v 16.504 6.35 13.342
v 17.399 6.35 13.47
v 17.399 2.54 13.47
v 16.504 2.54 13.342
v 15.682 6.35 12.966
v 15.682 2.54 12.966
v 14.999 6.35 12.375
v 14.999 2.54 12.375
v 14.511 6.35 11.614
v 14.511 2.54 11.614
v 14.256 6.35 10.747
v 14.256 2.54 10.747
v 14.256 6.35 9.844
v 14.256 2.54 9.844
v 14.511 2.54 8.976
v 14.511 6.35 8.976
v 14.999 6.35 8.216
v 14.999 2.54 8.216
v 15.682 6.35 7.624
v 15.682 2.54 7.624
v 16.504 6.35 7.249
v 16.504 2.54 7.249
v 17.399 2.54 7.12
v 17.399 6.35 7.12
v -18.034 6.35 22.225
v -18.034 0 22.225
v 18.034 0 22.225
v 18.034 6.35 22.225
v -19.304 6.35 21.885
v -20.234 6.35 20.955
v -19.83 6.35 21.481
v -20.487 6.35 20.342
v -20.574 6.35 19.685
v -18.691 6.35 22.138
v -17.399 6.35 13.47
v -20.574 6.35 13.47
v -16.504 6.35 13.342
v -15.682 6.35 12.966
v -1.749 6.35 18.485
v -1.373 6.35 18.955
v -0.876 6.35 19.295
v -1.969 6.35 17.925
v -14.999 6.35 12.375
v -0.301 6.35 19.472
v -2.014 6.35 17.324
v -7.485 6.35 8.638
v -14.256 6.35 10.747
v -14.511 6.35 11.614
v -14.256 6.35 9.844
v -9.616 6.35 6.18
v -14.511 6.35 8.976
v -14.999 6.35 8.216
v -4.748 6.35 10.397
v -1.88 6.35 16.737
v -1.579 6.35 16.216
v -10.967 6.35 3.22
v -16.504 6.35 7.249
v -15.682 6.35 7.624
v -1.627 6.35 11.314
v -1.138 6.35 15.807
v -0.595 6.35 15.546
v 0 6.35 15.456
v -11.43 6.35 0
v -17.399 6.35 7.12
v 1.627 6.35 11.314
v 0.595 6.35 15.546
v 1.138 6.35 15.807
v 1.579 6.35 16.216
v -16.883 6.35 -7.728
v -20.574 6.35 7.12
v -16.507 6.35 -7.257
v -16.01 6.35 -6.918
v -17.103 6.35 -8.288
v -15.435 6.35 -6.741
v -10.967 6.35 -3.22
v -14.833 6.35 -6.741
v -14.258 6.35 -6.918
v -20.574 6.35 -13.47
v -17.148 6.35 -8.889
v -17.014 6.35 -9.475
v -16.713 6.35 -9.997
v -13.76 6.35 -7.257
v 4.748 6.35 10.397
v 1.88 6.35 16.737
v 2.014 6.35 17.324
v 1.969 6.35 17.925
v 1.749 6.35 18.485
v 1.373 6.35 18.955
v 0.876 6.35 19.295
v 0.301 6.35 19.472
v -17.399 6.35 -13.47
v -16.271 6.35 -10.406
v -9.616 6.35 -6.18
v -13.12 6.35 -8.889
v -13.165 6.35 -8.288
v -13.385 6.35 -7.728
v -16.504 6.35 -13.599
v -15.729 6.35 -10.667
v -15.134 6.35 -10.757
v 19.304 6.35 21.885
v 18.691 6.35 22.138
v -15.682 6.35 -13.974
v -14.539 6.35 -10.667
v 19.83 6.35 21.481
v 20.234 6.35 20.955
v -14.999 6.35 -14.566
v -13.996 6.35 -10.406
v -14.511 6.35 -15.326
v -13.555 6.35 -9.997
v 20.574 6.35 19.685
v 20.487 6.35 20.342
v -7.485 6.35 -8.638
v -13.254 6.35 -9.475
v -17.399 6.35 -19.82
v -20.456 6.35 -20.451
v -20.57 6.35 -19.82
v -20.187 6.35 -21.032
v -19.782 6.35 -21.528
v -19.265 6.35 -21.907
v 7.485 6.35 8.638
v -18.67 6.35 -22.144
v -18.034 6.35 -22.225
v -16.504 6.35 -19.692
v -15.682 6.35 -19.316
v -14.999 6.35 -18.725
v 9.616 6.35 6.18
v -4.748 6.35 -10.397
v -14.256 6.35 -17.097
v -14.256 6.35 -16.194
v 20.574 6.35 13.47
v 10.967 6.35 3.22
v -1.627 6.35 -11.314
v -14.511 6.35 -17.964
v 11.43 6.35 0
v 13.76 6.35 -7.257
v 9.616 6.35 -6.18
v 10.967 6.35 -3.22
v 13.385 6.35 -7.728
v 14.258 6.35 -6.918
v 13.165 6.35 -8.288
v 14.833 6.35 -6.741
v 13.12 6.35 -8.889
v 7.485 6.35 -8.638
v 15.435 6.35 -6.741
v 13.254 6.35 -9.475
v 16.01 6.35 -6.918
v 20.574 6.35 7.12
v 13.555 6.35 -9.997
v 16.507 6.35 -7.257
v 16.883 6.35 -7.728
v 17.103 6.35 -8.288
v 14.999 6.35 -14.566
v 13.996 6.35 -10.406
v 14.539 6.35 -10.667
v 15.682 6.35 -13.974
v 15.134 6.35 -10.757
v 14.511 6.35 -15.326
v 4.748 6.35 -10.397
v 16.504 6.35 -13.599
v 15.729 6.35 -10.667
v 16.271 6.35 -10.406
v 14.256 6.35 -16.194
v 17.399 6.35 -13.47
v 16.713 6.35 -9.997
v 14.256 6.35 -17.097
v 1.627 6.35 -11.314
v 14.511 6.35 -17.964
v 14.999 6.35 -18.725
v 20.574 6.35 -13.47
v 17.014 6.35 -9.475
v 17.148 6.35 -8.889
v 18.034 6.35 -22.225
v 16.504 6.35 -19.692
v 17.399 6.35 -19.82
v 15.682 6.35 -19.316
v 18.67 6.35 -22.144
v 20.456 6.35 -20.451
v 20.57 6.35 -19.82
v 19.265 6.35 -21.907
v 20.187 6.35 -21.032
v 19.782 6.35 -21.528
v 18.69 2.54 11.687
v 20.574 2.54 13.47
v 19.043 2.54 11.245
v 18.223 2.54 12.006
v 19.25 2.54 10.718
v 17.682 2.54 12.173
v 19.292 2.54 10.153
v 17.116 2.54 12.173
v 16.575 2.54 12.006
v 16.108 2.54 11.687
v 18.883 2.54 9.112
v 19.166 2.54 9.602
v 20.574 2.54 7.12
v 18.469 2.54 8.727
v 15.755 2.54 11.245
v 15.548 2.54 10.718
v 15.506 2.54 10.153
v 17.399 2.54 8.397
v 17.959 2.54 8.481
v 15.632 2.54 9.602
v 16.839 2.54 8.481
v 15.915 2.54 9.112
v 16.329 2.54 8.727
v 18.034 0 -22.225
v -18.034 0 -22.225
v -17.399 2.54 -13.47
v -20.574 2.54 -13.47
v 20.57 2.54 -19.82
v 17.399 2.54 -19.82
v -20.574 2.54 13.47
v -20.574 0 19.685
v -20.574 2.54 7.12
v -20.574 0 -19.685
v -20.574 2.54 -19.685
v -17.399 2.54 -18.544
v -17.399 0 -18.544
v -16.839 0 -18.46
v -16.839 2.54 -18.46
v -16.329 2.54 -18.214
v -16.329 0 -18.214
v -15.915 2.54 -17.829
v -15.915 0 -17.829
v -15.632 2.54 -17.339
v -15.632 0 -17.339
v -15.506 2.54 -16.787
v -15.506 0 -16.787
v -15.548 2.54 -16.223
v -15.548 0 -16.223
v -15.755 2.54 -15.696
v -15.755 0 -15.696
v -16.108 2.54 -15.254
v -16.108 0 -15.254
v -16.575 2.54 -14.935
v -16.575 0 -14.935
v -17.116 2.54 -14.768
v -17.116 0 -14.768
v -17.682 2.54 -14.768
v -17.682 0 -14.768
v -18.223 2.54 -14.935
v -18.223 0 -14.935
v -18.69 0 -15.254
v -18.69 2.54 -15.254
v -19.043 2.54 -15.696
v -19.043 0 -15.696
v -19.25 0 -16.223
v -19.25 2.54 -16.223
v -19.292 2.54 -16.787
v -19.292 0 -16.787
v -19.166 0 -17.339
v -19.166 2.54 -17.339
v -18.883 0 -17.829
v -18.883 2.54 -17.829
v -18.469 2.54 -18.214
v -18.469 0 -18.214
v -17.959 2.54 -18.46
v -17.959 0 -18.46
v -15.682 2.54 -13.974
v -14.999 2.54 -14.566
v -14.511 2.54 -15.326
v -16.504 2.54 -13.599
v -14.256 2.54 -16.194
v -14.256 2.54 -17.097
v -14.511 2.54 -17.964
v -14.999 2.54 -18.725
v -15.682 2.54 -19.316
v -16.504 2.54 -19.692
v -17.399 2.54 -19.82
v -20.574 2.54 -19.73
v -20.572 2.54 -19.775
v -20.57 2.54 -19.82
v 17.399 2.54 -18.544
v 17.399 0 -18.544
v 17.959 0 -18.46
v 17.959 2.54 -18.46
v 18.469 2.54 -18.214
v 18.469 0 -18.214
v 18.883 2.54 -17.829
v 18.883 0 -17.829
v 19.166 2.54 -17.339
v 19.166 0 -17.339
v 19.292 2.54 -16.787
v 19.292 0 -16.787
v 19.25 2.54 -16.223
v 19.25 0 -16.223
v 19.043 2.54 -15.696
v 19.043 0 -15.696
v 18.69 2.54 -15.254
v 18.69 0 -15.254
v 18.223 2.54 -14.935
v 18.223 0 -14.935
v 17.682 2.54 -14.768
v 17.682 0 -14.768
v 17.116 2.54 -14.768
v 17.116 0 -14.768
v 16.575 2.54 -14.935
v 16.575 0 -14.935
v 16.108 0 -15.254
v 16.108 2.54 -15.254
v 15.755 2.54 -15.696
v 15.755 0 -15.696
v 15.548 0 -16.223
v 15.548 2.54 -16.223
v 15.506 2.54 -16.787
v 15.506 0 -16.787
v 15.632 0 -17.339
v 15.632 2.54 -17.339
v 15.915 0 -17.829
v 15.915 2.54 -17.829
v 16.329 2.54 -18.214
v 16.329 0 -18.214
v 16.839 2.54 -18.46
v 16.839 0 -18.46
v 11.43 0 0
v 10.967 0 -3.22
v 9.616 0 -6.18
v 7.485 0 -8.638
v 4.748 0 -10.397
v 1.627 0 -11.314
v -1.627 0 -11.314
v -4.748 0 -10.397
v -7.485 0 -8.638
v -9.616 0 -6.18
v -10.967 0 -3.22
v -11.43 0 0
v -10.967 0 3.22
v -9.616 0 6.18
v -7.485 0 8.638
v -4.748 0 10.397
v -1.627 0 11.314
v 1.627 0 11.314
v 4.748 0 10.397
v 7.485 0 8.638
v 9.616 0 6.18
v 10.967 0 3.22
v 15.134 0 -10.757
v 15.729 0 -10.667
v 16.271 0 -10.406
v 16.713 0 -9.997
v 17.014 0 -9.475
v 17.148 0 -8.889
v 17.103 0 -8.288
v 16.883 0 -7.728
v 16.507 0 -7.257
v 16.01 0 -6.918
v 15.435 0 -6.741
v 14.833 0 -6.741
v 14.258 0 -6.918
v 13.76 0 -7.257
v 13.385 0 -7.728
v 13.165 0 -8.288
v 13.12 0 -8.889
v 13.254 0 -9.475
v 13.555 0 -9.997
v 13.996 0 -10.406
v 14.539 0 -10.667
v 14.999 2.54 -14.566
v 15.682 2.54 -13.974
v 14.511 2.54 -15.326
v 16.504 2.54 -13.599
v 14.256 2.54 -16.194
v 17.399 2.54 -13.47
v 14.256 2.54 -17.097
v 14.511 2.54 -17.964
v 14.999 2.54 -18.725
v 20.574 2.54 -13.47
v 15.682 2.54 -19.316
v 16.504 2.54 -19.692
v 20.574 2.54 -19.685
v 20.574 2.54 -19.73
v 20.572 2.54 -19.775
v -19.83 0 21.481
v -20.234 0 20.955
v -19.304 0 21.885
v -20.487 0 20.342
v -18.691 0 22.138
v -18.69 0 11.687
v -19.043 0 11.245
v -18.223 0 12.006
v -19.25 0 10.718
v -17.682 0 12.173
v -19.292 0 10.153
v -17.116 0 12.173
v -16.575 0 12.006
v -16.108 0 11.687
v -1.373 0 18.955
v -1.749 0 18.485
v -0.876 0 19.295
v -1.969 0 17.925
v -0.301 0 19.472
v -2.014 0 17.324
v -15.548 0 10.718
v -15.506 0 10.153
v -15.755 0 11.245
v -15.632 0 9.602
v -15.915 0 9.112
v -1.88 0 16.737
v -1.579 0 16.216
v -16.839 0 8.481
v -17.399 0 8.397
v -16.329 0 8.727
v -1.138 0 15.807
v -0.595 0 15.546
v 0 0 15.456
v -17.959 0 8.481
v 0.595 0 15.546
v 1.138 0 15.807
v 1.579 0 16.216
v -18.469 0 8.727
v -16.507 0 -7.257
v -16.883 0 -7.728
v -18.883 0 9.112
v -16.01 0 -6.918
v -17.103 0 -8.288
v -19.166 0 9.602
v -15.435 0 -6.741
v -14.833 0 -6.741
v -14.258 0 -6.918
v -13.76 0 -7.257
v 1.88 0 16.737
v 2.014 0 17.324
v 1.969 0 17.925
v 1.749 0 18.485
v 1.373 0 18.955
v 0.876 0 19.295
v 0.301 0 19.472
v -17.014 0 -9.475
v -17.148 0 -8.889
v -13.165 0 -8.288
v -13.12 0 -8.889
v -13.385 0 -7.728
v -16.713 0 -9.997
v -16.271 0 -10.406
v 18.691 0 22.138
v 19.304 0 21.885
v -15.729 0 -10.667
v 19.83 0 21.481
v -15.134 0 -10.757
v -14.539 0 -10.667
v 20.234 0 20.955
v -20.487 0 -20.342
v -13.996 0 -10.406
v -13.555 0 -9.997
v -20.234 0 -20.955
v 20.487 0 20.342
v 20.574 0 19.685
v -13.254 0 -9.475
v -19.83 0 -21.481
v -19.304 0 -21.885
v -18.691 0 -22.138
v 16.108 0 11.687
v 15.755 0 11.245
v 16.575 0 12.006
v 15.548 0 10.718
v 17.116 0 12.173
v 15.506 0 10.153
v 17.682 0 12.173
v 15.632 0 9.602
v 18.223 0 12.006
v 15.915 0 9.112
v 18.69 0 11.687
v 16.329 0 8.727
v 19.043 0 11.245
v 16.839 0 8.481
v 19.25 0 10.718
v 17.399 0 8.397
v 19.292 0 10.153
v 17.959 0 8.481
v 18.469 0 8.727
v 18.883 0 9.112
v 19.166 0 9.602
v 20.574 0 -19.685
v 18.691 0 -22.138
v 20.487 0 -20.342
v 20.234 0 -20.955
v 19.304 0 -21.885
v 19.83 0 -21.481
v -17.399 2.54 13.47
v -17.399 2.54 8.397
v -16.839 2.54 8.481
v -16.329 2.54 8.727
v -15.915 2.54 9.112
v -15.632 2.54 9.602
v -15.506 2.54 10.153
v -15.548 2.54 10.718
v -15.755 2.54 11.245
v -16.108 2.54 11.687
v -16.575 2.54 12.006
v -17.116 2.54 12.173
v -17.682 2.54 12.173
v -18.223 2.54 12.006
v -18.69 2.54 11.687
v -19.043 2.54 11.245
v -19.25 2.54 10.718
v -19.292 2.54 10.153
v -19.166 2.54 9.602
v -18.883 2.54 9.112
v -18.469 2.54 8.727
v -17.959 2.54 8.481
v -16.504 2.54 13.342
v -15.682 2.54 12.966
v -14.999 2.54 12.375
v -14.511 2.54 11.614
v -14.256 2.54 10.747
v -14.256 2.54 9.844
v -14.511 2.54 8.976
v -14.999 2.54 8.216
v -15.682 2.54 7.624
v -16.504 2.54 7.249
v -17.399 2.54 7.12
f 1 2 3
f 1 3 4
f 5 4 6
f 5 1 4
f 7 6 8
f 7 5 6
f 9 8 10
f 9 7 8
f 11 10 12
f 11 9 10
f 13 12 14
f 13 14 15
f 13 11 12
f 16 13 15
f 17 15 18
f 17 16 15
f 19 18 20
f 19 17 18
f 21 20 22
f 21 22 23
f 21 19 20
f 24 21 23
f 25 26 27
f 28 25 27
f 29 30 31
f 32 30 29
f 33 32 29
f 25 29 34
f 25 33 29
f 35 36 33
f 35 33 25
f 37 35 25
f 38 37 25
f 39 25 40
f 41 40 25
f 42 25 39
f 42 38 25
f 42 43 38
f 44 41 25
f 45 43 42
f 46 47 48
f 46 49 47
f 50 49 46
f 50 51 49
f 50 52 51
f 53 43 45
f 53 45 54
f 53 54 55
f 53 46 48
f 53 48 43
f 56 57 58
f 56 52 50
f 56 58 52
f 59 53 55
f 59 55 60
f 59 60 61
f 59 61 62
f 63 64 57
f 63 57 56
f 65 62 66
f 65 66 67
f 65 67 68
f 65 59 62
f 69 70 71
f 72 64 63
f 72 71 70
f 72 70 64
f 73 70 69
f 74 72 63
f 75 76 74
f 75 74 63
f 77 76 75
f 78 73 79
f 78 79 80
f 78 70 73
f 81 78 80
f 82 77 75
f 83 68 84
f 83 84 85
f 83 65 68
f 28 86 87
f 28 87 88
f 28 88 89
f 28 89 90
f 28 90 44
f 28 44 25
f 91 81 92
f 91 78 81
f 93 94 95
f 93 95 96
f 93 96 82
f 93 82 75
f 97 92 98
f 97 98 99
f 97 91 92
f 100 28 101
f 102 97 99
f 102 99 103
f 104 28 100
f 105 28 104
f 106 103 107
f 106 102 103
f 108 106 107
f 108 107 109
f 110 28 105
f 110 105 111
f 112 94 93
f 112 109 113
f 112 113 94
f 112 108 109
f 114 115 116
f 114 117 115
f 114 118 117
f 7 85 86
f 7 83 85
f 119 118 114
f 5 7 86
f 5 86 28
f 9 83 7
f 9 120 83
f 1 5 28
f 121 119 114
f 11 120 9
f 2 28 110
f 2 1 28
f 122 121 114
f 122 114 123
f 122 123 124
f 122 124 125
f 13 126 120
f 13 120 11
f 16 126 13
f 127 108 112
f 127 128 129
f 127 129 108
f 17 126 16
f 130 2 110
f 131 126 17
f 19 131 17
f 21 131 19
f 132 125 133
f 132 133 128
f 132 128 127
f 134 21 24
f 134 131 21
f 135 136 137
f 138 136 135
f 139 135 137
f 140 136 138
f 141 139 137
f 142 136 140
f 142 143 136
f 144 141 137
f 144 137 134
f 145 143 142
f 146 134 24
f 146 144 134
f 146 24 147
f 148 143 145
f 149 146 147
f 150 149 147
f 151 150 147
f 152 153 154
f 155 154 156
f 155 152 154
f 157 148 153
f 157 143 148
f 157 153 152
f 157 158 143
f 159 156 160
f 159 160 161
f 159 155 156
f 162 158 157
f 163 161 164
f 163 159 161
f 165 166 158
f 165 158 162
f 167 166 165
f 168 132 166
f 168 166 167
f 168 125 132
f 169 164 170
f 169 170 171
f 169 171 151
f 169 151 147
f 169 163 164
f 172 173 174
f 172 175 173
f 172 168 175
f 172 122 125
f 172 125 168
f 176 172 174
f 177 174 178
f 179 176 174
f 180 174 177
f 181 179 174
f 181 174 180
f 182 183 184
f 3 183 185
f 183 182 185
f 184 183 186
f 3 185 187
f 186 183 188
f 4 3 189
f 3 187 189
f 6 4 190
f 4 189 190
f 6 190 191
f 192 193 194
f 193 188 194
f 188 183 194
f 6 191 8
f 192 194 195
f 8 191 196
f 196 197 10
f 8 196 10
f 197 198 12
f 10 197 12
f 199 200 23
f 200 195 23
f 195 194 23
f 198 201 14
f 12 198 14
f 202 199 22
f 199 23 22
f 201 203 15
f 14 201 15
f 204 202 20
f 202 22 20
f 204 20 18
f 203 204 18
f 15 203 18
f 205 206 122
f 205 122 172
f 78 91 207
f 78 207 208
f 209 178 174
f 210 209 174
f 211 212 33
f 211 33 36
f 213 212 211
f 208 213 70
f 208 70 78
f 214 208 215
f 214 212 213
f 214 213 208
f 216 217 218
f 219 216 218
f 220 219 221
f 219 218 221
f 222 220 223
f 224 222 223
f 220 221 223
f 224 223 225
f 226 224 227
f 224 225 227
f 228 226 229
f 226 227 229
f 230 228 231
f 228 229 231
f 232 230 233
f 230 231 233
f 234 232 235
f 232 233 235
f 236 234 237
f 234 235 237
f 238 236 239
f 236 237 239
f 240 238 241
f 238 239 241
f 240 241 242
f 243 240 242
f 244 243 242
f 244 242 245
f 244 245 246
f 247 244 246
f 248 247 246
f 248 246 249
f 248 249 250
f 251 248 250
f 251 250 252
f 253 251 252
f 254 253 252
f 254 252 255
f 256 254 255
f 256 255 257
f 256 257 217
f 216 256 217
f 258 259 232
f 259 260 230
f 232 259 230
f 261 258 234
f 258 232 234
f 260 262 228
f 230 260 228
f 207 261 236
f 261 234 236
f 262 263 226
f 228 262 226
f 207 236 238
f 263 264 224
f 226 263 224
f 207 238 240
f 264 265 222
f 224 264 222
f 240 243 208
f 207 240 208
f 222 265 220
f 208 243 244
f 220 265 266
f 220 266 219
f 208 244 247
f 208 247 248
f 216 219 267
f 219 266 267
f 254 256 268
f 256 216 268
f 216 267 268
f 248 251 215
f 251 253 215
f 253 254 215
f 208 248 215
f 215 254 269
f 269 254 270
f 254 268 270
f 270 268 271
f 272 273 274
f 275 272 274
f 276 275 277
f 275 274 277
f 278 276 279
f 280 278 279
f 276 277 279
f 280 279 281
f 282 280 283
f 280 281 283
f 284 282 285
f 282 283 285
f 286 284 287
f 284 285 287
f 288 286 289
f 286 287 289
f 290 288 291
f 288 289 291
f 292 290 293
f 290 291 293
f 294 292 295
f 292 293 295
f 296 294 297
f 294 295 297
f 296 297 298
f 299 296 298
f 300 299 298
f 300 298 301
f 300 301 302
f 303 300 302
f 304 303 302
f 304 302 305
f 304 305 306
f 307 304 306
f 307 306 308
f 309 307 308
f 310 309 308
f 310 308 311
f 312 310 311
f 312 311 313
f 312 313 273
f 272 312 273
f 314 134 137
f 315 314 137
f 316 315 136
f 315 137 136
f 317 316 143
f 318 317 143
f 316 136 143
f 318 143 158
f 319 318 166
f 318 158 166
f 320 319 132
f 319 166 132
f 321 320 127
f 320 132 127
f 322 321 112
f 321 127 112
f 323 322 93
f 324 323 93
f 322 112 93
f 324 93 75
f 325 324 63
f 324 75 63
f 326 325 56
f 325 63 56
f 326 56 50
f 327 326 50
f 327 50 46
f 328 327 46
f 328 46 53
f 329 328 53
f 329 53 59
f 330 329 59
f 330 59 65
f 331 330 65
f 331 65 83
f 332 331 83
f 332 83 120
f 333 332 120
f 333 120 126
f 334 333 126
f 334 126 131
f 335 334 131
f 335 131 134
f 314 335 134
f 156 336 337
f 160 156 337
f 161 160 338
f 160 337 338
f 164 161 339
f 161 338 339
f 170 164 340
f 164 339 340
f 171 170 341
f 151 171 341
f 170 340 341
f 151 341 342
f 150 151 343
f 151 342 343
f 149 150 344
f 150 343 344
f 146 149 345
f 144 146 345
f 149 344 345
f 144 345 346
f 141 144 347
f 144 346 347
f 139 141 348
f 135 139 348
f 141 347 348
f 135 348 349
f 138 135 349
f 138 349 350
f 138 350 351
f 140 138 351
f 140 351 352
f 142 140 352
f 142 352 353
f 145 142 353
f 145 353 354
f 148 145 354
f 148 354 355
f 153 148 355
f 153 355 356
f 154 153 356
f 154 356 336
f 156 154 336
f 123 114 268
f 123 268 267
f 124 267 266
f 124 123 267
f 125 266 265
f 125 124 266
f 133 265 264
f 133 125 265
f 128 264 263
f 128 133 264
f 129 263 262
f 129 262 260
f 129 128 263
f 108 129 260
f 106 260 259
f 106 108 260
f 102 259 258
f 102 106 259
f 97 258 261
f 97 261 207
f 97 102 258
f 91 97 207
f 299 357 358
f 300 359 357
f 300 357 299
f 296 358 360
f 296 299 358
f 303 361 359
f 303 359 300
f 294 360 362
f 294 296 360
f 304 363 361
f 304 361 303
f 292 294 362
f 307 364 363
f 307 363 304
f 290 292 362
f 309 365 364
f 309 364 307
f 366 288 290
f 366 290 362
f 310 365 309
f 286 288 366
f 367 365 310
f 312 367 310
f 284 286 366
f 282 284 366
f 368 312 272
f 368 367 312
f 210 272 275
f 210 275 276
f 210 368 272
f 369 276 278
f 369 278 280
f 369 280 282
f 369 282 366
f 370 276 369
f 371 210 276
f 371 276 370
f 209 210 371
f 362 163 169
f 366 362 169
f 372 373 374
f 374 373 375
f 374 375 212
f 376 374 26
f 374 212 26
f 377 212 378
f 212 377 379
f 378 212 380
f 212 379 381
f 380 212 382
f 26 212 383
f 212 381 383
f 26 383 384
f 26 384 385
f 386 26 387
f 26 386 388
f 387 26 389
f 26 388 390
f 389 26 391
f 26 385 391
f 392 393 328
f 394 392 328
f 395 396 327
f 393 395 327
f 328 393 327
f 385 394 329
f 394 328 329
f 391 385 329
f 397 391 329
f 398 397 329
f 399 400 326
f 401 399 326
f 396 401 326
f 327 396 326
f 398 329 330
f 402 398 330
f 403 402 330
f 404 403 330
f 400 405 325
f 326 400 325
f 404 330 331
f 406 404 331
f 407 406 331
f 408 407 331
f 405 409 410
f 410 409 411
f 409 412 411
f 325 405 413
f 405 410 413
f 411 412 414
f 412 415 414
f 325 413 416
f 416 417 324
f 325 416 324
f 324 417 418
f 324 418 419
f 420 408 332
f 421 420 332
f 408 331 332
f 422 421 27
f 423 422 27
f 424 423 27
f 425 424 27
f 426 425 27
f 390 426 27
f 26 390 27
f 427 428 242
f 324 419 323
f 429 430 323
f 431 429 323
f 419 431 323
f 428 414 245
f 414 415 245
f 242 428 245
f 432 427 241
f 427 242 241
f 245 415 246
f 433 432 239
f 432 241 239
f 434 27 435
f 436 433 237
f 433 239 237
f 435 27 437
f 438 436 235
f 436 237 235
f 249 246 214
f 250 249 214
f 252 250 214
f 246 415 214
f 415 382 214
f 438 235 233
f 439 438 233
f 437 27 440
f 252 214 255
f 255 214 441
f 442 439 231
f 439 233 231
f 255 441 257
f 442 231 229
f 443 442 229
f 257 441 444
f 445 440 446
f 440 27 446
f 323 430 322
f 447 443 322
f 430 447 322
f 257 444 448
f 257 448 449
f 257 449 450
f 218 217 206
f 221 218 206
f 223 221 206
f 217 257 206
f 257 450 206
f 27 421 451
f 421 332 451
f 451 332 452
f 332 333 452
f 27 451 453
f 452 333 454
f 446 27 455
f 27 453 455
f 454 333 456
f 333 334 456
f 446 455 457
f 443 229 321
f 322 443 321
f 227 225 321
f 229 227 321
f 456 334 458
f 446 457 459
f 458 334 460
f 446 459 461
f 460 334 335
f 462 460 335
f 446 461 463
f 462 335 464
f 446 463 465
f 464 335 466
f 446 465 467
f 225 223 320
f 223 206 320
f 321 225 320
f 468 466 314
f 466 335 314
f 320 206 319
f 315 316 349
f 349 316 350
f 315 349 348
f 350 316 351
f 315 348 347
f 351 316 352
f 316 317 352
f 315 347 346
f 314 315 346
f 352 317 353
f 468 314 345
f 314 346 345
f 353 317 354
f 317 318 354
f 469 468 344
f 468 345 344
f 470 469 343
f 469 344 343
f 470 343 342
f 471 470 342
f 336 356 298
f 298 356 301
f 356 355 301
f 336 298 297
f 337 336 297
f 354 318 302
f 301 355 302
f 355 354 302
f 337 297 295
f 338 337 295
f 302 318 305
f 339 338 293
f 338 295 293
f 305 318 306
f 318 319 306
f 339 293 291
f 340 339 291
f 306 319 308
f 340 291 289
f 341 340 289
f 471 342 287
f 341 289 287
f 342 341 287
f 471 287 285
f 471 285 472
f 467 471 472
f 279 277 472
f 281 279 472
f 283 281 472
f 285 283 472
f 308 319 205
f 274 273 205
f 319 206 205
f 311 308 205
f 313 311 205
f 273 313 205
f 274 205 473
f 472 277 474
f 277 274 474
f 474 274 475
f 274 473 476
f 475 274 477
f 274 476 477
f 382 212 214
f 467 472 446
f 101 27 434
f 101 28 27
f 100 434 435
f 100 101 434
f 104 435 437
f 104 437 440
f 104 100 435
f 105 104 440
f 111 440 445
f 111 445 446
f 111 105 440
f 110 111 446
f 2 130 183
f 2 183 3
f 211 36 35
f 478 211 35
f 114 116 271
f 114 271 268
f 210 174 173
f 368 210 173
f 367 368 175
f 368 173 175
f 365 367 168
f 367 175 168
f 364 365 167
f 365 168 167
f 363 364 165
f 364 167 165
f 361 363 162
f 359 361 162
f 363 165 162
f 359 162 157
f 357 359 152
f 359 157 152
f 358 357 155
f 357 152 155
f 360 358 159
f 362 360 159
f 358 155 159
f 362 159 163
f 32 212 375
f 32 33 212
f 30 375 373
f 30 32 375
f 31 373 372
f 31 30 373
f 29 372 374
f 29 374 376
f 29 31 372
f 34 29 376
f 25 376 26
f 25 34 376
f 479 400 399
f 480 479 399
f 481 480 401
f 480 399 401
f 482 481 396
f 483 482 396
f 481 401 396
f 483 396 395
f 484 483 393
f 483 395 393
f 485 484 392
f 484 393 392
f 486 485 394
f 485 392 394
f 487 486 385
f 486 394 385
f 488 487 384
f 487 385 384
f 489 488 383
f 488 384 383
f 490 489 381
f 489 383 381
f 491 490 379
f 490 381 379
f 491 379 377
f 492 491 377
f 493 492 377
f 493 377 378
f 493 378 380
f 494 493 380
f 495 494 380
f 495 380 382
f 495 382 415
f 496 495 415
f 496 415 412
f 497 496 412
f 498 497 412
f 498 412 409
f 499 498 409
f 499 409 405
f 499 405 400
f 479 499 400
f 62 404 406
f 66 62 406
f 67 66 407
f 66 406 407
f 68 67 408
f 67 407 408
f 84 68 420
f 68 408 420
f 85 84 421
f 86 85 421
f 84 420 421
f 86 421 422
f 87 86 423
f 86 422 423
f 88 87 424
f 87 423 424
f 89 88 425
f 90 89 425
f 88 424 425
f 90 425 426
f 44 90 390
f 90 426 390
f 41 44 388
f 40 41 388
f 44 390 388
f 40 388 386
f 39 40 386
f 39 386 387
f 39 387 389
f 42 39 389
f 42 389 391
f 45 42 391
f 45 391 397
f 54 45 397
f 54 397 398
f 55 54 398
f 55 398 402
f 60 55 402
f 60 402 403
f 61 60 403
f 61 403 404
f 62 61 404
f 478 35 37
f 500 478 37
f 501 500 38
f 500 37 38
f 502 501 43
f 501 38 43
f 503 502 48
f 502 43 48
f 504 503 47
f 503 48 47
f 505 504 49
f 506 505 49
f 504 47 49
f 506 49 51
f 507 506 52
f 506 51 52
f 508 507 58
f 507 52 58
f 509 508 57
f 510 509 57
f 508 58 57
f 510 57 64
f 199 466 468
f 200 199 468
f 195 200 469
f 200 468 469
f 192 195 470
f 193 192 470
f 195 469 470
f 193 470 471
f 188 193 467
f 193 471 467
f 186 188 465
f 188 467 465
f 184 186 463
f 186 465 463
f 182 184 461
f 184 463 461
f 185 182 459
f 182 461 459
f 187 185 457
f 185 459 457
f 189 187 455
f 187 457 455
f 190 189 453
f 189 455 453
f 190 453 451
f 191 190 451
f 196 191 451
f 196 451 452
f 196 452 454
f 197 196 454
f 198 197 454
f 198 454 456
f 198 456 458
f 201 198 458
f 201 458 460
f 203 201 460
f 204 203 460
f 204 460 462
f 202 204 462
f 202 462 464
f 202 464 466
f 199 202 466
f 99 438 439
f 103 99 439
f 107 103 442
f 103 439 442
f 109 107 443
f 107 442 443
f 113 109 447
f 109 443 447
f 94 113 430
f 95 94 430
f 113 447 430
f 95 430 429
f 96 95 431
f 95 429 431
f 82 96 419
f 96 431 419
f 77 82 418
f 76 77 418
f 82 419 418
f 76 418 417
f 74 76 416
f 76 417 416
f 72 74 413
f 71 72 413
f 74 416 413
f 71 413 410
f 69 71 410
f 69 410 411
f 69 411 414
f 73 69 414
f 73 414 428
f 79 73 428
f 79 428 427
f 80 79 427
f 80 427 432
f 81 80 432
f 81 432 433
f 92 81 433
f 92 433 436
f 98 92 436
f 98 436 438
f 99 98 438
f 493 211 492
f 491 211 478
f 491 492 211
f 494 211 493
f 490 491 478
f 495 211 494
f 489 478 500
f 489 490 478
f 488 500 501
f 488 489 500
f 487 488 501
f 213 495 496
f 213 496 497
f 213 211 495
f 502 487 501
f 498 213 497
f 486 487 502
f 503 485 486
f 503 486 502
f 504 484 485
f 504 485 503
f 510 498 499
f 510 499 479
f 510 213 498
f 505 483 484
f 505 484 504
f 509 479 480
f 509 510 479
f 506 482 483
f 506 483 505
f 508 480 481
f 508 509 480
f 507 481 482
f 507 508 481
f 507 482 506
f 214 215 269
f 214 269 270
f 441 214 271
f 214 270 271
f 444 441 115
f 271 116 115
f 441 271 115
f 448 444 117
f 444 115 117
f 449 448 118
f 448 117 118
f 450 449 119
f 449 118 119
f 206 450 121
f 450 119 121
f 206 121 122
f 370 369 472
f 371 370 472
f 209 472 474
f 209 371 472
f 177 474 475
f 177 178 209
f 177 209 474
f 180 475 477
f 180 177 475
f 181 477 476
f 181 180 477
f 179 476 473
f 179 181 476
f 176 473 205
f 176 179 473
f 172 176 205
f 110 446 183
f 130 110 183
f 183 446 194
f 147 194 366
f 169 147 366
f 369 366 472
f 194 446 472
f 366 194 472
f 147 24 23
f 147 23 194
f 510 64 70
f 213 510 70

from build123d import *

# Parameters (mm, degrees)
SKETCH1_W                    = 41.148
SKETCH1_H                    = 44.45
BOSS_EXTRUDE1_DEPTH          = 6.35
FILLET1_R                    = 2.54
SKETCH2_R                    = 11.43
CUT_EXTRUDE1_DEPTH           = 7.35
F_25_0_1495_DIAMETER_HOLE1_D = 3.7973
F_10_32_TAPPED_HOLE2_D       = 4.0386
CUT_EXTRUDE2_DEPTH           = 3.81


with BuildPart() as part:
    # Sketch1 → Boss-Extrude1 (new body)
    with BuildSketch(Plane(origin=(0, 0, 0), x_dir=(1, 0, 0), z_dir=(0, 1, 0))):
        Rectangle(SKETCH1_W, SKETCH1_H)
    extrude(amount=BOSS_EXTRUDE1_DEPTH)

    # Fillet1
    fillet1_edges = [part.edges().sort_by_distance(p)[0] for p in [
        (-20.574, 3.175, -22.225),
        (20.574, 3.175, -22.225),
        (20.574, 3.175, 22.225),
        (-20.574, 3.175, 22.225),
    ]]
    fillet(fillet1_edges, radius=FILLET1_R)

    # Sketch2 → Cut-Extrude1 (cut, through all)
    with BuildSketch(Plane(origin=(0, 6.35, 0), x_dir=(1, 0, 0), z_dir=(0, 1, 0))):
        Circle(SKETCH2_R)
    extrude(amount=-CUT_EXTRUDE1_DEPTH, mode=Mode.SUBTRACT)

    # #25 (0.1495) Diameter Hole1 (through all)
    with Locations(Plane(origin=(-17.399, 6.35, -16.645384286), x_dir=(0, 0, 1), z_dir=(0, 1, 0))):
        with Locations((0, 0), (0, 34.798), (26.940768363, 34.798), (26.940768363, 0)):
            Hole(F_25_0_1495_DIAMETER_HOLE1_D / 2)

    # #10-32 Tapped Hole2 (through all)
    with Locations(Plane(origin=(-15.133967136, 6.35, -8.7376), x_dir=(0, 0, 1), z_dir=(0, 1, 0))):
        with Locations((0, 0), (0, 30.267934272), (26.2128, 15.133967136)):
            Hole(F_10_32_TAPPED_HOLE2_D / 2)

    # Sketch9 → Cut-Extrude2 (cut)
    with BuildSketch(Plane(origin=(0, 6.35, 0), x_dir=(1, 0, 0), z_dir=(0, 1, 0))):
        with BuildLine():
            Line((-20.574, 13.470384286), (-20.574, 19.820384286))
            Line((-20.574, 19.820384286), (-17.399, 19.820384286))
            ThreePointArc((-17.399, 19.820384286), (-14.224, 16.645384286), (-17.399, 13.470384286))
            Line((-17.399, 13.470384286), (-20.574, 13.470384286))
        make_face()
        with BuildLine():
            Line((17.399, 13.470384286), (20.574, 13.470384286))
            Line((20.574, 13.470384286), (20.574, 19.820384286))
            Line((20.574, 19.820384286), (17.399, 19.820384286))
            ThreePointArc((17.399, 19.820384286), (14.224, 16.645384286), (17.399, 13.470384286))
        make_face()
        with BuildLine():
            Line((20.574, -7.120384286), (20.574, -13.470384286))
            Line((20.574, -13.470384286), (17.399, -13.470384286))
            ThreePointArc((17.399, -13.470384286), (14.224, -10.295384286), (17.399, -7.120384286))
            Line((17.399, -7.120384286), (20.574, -7.120384286))
        make_face()
        with BuildLine():
            Line((-17.399, -7.120384286), (-20.574, -7.120384286))
            Line((-20.574, -7.120384286), (-20.574, -13.470384286))
            Line((-20.574, -13.470384286), (-17.399, -13.470384286))
            ThreePointArc((-17.399, -13.470384286), (-14.224, -10.295384286), (-17.399, -7.120384286))
        make_face()
    extrude(amount=-CUT_EXTRUDE2_DEPTH, mode=Mode.SUBTRACT)


solid = part.part
